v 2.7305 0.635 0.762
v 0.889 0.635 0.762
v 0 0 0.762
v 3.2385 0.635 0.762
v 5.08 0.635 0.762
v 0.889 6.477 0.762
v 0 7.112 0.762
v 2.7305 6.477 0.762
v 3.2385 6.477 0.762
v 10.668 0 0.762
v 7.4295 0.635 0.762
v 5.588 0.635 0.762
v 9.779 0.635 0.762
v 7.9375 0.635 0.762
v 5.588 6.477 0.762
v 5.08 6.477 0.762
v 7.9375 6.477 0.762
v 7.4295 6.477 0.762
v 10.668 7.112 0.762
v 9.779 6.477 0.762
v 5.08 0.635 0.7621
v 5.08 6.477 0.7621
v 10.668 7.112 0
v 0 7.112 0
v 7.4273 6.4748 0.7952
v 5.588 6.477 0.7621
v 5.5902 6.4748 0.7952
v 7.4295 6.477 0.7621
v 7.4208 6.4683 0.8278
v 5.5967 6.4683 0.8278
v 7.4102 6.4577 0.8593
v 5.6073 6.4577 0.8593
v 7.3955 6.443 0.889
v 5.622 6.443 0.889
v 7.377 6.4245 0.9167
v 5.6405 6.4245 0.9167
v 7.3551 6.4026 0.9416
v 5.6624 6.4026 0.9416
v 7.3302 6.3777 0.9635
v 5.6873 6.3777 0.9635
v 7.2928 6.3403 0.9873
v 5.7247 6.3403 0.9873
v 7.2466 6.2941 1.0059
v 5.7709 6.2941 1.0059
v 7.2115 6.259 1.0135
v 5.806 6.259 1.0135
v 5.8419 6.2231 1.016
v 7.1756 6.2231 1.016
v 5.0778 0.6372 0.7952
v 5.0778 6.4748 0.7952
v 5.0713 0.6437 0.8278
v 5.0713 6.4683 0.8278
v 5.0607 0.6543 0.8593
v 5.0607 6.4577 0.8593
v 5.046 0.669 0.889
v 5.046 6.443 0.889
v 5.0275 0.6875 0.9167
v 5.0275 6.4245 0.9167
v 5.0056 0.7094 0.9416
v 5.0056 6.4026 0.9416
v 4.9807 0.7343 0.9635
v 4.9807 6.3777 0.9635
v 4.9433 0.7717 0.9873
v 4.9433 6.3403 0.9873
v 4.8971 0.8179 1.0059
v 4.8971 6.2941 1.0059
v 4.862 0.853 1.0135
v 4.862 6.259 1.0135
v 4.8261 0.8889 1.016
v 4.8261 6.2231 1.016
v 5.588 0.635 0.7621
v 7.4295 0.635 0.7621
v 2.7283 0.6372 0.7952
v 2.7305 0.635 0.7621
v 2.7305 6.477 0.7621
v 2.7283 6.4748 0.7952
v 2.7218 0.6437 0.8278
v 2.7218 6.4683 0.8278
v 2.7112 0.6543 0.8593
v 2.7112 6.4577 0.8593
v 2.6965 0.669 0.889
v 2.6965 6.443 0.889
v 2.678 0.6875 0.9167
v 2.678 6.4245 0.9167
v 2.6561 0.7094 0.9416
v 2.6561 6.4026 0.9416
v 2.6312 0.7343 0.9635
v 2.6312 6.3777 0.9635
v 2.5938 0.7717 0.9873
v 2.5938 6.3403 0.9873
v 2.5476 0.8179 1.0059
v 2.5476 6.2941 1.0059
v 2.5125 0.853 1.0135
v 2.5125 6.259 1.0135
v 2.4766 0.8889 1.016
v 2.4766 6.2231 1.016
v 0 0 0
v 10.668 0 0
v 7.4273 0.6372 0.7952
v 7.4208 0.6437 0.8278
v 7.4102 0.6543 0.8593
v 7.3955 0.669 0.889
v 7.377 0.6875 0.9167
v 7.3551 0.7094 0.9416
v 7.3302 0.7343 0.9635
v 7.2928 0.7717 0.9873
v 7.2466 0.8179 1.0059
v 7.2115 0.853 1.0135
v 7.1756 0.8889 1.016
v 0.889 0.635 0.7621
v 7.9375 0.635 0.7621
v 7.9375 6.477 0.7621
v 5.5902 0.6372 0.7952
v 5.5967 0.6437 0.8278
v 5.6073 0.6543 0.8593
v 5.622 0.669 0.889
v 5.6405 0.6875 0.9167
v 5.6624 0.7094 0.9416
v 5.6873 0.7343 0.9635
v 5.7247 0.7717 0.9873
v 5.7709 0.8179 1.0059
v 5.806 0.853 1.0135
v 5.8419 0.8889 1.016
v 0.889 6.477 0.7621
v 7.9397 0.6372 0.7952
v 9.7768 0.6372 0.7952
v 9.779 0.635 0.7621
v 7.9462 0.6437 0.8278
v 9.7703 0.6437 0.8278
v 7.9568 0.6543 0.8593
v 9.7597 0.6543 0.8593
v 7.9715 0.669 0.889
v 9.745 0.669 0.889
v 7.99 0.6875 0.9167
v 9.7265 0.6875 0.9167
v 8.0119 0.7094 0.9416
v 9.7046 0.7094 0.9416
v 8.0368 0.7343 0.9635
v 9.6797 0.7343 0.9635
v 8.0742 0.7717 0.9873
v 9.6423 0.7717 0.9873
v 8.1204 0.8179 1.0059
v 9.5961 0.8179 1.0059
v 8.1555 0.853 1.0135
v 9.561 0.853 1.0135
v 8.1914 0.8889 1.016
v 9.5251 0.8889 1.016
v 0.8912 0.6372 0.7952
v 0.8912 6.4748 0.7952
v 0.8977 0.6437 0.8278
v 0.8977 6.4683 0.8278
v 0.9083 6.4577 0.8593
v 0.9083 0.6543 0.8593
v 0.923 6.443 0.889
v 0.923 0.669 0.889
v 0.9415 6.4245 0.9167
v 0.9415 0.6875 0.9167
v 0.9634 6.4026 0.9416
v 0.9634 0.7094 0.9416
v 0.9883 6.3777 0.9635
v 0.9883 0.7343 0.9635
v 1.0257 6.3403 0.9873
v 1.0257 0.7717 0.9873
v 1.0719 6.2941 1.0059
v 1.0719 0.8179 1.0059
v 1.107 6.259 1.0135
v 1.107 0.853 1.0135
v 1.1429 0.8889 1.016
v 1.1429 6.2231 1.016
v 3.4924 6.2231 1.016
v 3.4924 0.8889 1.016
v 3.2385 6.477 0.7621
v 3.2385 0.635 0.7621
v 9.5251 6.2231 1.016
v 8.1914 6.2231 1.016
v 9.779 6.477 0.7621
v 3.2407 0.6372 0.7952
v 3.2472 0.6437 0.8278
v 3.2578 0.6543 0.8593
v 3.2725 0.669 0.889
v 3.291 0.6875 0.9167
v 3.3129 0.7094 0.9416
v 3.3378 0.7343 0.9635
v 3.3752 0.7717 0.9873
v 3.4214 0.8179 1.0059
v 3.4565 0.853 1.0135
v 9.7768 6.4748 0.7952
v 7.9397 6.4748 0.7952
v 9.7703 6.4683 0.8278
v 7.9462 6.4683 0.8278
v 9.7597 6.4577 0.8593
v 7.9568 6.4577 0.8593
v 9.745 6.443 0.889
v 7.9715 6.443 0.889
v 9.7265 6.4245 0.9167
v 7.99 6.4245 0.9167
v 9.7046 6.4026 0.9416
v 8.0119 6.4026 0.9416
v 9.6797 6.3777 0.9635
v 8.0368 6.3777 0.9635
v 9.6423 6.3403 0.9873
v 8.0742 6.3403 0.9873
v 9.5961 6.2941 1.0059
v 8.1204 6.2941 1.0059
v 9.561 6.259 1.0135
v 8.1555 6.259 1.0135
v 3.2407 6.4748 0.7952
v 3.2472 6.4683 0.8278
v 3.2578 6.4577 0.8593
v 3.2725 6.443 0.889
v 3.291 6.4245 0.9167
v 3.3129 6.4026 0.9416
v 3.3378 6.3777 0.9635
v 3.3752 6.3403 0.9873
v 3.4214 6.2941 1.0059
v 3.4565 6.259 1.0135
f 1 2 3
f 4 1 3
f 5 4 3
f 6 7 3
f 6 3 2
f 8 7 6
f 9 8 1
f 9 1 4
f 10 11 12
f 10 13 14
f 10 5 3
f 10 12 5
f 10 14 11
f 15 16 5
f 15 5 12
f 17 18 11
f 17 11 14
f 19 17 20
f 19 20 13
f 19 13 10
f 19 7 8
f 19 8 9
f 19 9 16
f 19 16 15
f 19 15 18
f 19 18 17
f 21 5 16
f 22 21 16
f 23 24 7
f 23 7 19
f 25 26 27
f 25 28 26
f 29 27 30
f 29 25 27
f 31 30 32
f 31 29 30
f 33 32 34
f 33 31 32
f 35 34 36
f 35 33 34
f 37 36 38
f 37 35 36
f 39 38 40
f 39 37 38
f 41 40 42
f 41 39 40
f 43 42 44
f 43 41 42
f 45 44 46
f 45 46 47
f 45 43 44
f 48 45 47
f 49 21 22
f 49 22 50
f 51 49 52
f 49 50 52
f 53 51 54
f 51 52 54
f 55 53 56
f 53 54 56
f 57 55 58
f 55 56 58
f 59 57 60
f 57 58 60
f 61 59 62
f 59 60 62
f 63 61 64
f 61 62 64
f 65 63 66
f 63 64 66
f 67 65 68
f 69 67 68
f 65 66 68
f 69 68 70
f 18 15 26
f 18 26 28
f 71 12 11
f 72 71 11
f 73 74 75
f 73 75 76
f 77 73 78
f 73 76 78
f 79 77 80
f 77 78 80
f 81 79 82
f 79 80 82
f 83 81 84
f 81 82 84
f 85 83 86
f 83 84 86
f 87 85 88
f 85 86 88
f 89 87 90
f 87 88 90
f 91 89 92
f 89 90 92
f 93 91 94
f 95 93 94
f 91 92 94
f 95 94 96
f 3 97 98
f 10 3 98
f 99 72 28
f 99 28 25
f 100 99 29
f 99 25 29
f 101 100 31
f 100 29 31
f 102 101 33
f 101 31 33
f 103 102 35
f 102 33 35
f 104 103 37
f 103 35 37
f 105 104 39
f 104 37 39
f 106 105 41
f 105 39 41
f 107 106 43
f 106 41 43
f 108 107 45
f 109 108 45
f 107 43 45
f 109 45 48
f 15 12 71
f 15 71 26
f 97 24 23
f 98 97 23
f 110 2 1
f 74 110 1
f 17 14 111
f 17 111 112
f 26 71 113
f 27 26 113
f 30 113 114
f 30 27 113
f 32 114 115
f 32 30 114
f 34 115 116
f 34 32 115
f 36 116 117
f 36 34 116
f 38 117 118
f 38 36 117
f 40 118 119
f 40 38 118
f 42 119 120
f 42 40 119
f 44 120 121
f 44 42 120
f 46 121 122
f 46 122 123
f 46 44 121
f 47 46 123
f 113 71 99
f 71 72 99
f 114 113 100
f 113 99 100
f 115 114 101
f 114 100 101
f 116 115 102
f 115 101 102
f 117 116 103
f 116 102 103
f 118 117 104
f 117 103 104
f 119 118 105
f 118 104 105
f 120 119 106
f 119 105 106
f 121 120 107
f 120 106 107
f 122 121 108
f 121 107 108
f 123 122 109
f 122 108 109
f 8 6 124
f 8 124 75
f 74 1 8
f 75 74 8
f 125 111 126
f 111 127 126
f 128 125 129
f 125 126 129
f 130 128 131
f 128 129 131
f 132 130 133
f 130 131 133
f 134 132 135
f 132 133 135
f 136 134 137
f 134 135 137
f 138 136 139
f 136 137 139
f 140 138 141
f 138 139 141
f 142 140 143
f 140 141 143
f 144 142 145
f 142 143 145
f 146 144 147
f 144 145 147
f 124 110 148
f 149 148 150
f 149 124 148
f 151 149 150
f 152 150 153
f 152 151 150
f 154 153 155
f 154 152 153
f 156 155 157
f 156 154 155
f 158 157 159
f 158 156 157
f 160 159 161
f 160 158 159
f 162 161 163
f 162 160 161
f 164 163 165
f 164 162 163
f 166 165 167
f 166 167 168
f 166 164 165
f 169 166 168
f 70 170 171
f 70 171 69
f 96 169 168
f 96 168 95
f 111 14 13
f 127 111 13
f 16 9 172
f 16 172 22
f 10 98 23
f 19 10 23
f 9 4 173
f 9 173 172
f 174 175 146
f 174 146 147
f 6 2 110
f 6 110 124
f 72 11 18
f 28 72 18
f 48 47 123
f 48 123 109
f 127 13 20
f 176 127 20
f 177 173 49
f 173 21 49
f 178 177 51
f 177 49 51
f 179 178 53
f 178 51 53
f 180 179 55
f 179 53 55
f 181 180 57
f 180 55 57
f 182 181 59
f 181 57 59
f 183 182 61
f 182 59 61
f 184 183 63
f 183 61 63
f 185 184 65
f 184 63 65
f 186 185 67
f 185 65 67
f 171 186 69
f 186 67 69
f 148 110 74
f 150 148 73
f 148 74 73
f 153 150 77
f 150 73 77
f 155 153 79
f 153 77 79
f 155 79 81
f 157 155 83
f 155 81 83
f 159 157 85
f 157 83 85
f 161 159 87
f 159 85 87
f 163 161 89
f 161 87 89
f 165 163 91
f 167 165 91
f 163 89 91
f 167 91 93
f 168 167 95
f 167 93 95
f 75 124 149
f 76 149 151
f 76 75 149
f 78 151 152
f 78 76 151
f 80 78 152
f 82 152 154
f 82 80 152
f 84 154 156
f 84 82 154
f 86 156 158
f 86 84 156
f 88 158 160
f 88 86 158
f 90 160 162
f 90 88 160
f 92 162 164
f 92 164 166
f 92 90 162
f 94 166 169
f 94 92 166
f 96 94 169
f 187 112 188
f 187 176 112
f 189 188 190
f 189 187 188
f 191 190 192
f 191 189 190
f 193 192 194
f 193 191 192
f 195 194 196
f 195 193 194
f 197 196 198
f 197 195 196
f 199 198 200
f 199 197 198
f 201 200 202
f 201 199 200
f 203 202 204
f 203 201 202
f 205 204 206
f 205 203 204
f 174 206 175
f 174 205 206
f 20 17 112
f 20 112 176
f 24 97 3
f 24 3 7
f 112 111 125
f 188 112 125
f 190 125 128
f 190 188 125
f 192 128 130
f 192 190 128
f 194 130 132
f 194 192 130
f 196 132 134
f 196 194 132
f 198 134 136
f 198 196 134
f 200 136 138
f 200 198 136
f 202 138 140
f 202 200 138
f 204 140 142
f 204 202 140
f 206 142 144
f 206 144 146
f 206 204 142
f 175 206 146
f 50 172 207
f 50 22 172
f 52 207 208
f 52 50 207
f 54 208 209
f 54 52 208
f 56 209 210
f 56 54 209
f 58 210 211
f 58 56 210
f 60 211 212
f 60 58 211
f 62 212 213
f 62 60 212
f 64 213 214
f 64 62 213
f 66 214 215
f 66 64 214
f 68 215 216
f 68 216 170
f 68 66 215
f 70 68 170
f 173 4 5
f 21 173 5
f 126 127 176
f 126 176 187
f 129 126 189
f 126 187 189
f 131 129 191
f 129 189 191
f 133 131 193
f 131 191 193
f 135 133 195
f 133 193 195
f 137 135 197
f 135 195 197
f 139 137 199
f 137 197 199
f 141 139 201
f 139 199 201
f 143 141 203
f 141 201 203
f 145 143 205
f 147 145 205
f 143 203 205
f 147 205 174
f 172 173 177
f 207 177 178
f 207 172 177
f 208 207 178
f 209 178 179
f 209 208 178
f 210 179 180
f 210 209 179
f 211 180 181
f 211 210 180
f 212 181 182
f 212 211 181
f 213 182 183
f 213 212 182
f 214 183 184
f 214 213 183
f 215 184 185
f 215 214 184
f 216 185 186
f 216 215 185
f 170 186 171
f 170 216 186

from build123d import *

# Parameters (mm, degrees)
SKETCH1_W           = 10.668
SKETCH1_H           = 7.112
BOSS_EXTRUDE1_DEPTH = 0.762
SKETCH2_W           = 1.8415
SKETCH2_H           = 5.842
BOSS_EXTRUDE2_DEPTH = 0.254
FILLET1_R           = 0.254


with BuildPart() as part:
    # Sketch1 → Boss-Extrude1 (new body)
    with BuildSketch(Plane.XY):
        with Locations((5.334, 3.556)):
            Rectangle(SKETCH1_W, SKETCH1_H)
    extrude(amount=BOSS_EXTRUDE1_DEPTH)

    # Sketch2 → Boss-Extrude2 (add)
    with BuildSketch(Plane.XY.offset(0.762)):
        with Locations((8.85825, 3.556)):
            Rectangle(SKETCH2_W, SKETCH2_H)
        with Locations((1.80975, 3.556)):
            Rectangle(SKETCH2_W, SKETCH2_H)
        with Locations((4.15925, 3.556)):
            Rectangle(SKETCH2_W, SKETCH2_H)
        with Locations((6.50875, 3.556)):
            Rectangle(SKETCH2_W, SKETCH2_H)
    extrude(amount=BOSS_EXTRUDE2_DEPTH)

    # Fillet1
    fillet1_edges = [part.edges().sort_by_distance(p)[0] for p in [
        (2.7305, 3.556, 1.016),
        (1.80975, 0.635, 1.016),
        (0.889, 3.556, 1.016),
        (1.80975, 6.477, 1.016),
        (5.08, 3.556, 1.016),
        (4.15925, 0.635, 1.016),
        (3.2385, 3.556, 1.016),
        (4.15925, 6.477, 1.016),
        (9.779, 3.556, 1.016),
        (8.85825, 0.635, 1.016),
        (7.9375, 3.556, 1.016),
        (8.85825, 6.477, 1.016),
        (7.4295, 3.556, 1.016),
        (6.50875, 0.635, 1.016),
        (5.588, 3.556, 1.016),
        (6.50875, 6.477, 1.016),
    ]]
    fillet(fillet1_edges, radius=FILLET1_R - 0.0001)  # a hair under: the kernel refuses the full size


solid = part.part
